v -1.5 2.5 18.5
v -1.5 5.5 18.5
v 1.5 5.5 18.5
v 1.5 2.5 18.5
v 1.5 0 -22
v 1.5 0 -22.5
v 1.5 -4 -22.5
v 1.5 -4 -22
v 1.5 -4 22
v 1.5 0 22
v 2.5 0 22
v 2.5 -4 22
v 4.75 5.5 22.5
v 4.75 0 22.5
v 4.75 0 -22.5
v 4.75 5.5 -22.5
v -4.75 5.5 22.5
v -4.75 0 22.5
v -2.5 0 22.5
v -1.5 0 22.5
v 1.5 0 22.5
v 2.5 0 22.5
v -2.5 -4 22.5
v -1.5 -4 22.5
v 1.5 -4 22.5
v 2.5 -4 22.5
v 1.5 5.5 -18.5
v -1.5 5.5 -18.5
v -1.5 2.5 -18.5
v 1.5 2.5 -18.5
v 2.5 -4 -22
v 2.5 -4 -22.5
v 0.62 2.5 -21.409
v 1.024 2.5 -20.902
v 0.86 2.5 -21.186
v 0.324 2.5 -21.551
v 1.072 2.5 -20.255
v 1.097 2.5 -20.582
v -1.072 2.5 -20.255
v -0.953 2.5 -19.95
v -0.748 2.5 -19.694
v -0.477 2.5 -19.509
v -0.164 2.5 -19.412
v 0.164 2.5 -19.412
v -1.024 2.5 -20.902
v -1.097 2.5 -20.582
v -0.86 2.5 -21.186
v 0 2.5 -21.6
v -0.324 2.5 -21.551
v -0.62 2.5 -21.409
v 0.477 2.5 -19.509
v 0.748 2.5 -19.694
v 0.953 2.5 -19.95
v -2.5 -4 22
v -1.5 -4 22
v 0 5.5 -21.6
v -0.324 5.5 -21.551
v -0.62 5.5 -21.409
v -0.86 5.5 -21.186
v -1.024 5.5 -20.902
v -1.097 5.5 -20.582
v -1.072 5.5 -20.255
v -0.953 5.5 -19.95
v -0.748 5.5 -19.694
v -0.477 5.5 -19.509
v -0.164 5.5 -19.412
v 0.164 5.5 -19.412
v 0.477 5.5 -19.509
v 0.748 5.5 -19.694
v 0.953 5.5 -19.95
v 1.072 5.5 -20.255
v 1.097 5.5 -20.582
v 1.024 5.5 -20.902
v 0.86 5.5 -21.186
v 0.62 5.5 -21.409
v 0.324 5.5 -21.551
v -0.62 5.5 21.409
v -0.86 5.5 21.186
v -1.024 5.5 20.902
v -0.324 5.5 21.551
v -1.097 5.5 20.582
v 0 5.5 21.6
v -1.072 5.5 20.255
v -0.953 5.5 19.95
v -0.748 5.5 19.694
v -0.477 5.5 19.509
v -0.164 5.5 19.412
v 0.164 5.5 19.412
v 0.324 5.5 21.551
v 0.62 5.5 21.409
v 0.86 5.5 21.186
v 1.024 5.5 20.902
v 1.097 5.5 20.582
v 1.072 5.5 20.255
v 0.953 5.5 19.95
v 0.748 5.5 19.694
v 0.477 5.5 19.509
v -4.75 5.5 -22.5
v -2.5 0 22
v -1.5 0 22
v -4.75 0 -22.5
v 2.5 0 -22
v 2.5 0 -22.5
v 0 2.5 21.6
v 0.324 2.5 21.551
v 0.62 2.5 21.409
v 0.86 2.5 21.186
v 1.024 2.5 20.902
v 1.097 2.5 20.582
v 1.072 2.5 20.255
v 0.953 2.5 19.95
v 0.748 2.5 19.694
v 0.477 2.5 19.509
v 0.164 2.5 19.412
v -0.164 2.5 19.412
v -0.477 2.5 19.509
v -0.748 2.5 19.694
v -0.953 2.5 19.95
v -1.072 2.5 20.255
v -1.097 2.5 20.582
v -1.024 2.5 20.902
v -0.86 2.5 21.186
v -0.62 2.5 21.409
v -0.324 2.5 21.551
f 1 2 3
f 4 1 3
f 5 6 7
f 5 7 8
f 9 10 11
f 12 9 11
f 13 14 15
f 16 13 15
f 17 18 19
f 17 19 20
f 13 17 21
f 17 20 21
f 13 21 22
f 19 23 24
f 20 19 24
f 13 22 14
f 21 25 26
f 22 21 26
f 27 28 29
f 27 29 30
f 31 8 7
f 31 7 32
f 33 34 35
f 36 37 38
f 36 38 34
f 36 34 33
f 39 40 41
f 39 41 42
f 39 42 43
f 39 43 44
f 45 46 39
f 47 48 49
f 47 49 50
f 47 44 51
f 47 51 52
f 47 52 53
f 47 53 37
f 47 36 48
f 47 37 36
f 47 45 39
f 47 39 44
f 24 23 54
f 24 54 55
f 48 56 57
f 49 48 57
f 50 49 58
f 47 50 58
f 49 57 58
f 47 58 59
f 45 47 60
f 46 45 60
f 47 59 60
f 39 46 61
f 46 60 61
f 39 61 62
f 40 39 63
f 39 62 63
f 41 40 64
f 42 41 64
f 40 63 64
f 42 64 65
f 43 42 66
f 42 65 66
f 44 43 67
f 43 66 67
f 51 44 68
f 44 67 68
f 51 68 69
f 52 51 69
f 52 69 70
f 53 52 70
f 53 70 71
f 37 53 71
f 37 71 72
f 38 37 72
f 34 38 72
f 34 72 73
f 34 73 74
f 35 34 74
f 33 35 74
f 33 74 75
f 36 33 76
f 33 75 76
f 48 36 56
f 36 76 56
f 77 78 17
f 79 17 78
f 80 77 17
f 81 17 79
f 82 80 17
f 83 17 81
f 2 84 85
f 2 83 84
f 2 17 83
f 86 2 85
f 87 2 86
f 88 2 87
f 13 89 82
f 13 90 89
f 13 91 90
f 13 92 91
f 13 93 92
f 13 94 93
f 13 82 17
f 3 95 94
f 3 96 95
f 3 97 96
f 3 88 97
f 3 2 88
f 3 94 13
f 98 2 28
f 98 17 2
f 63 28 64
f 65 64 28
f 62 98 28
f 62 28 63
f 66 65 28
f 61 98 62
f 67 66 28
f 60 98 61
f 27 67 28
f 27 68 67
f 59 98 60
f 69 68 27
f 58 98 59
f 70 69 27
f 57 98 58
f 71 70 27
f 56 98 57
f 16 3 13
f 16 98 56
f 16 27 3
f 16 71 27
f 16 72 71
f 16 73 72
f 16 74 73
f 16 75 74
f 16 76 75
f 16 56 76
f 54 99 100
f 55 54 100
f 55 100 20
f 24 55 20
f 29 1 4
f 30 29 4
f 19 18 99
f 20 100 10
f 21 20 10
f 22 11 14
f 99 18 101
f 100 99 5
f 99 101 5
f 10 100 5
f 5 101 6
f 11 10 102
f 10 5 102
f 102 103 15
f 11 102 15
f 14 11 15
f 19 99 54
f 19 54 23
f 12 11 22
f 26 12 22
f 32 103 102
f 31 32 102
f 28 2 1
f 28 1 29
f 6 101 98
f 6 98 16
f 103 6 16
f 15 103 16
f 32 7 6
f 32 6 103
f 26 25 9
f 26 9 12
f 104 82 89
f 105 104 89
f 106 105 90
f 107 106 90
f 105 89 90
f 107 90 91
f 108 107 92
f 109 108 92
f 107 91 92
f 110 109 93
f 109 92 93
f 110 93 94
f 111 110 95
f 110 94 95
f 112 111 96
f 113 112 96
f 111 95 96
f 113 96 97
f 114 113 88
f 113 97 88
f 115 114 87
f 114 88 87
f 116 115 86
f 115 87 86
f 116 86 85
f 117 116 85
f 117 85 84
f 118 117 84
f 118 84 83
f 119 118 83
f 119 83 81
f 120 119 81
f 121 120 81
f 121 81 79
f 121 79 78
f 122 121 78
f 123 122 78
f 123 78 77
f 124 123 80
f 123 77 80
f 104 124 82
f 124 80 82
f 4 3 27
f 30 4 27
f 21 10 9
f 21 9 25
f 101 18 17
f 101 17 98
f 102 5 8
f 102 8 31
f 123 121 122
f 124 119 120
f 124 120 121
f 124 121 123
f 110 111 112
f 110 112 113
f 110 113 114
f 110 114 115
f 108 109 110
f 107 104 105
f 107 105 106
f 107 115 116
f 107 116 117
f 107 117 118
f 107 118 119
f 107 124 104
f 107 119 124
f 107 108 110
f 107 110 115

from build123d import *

# Parameters (mm, degrees)
SKETCH_1_W          = 9.5
SKETCH_1_H          = 45
EXTRUDE_1_DEPTH     = 5.5
SKETCH_2_W          = 3
SKETCH_2_H          = 37
CUT_EXTRUDE_1_DEPTH = 3
SKETCH_3_R          = 1.1
CUT_EXTRUDE_2_DEPTH = 3
SKETCH_4_W          = 1
SKETCH_4_H          = 0.5
EXTRUDE_2_DEPTH     = 4


with BuildPart() as part:
    # 草图1 → 凸台-拉伸1 (new body)
    with BuildSketch(Plane(origin=(0, 0, 0), x_dir=(1, 0, 0), z_dir=(0, 1, 0))):
        Rectangle(SKETCH_1_W, SKETCH_1_H)
    extrude(amount=EXTRUDE_1_DEPTH)

    # 草图2 → 切除-拉伸1 (cut)
    with BuildSketch(Plane(origin=(0, 5.5, 0), x_dir=(1, 0, 0), z_dir=(0, 1, 0))):
        Rectangle(SKETCH_2_W, SKETCH_2_H)
    extrude(amount=-CUT_EXTRUDE_1_DEPTH, mode=Mode.SUBTRACT)

    # 草图3 → 切除-拉伸2 (cut)
    with BuildSketch(Plane(origin=(0, 5.5, 0), x_dir=(1, 0, 0), z_dir=(0, 1, 0))):
        with Locations(Location((0, -20.5, 0), (0, 0, 270))):
            Circle(SKETCH_3_R)
        with Locations(Location((0, 20.5, 0), (0, 0, 90))):
            Circle(SKETCH_3_R)
    extrude(amount=-CUT_EXTRUDE_2_DEPTH, mode=Mode.SUBTRACT)

    # 草图4 → 凸台-拉伸2 (add)
    with BuildSketch(Plane.XZ):
        with Locations((2, 22.25)):
            Rectangle(SKETCH_4_W, SKETCH_4_H)
        with Locations((-2, 22.25)):
            Rectangle(SKETCH_4_W, SKETCH_4_H)
        with Locations((2, -22.25)):
            Rectangle(SKETCH_4_W, SKETCH_4_H)
    extrude(amount=EXTRUDE_2_DEPTH)


solid = part.part
